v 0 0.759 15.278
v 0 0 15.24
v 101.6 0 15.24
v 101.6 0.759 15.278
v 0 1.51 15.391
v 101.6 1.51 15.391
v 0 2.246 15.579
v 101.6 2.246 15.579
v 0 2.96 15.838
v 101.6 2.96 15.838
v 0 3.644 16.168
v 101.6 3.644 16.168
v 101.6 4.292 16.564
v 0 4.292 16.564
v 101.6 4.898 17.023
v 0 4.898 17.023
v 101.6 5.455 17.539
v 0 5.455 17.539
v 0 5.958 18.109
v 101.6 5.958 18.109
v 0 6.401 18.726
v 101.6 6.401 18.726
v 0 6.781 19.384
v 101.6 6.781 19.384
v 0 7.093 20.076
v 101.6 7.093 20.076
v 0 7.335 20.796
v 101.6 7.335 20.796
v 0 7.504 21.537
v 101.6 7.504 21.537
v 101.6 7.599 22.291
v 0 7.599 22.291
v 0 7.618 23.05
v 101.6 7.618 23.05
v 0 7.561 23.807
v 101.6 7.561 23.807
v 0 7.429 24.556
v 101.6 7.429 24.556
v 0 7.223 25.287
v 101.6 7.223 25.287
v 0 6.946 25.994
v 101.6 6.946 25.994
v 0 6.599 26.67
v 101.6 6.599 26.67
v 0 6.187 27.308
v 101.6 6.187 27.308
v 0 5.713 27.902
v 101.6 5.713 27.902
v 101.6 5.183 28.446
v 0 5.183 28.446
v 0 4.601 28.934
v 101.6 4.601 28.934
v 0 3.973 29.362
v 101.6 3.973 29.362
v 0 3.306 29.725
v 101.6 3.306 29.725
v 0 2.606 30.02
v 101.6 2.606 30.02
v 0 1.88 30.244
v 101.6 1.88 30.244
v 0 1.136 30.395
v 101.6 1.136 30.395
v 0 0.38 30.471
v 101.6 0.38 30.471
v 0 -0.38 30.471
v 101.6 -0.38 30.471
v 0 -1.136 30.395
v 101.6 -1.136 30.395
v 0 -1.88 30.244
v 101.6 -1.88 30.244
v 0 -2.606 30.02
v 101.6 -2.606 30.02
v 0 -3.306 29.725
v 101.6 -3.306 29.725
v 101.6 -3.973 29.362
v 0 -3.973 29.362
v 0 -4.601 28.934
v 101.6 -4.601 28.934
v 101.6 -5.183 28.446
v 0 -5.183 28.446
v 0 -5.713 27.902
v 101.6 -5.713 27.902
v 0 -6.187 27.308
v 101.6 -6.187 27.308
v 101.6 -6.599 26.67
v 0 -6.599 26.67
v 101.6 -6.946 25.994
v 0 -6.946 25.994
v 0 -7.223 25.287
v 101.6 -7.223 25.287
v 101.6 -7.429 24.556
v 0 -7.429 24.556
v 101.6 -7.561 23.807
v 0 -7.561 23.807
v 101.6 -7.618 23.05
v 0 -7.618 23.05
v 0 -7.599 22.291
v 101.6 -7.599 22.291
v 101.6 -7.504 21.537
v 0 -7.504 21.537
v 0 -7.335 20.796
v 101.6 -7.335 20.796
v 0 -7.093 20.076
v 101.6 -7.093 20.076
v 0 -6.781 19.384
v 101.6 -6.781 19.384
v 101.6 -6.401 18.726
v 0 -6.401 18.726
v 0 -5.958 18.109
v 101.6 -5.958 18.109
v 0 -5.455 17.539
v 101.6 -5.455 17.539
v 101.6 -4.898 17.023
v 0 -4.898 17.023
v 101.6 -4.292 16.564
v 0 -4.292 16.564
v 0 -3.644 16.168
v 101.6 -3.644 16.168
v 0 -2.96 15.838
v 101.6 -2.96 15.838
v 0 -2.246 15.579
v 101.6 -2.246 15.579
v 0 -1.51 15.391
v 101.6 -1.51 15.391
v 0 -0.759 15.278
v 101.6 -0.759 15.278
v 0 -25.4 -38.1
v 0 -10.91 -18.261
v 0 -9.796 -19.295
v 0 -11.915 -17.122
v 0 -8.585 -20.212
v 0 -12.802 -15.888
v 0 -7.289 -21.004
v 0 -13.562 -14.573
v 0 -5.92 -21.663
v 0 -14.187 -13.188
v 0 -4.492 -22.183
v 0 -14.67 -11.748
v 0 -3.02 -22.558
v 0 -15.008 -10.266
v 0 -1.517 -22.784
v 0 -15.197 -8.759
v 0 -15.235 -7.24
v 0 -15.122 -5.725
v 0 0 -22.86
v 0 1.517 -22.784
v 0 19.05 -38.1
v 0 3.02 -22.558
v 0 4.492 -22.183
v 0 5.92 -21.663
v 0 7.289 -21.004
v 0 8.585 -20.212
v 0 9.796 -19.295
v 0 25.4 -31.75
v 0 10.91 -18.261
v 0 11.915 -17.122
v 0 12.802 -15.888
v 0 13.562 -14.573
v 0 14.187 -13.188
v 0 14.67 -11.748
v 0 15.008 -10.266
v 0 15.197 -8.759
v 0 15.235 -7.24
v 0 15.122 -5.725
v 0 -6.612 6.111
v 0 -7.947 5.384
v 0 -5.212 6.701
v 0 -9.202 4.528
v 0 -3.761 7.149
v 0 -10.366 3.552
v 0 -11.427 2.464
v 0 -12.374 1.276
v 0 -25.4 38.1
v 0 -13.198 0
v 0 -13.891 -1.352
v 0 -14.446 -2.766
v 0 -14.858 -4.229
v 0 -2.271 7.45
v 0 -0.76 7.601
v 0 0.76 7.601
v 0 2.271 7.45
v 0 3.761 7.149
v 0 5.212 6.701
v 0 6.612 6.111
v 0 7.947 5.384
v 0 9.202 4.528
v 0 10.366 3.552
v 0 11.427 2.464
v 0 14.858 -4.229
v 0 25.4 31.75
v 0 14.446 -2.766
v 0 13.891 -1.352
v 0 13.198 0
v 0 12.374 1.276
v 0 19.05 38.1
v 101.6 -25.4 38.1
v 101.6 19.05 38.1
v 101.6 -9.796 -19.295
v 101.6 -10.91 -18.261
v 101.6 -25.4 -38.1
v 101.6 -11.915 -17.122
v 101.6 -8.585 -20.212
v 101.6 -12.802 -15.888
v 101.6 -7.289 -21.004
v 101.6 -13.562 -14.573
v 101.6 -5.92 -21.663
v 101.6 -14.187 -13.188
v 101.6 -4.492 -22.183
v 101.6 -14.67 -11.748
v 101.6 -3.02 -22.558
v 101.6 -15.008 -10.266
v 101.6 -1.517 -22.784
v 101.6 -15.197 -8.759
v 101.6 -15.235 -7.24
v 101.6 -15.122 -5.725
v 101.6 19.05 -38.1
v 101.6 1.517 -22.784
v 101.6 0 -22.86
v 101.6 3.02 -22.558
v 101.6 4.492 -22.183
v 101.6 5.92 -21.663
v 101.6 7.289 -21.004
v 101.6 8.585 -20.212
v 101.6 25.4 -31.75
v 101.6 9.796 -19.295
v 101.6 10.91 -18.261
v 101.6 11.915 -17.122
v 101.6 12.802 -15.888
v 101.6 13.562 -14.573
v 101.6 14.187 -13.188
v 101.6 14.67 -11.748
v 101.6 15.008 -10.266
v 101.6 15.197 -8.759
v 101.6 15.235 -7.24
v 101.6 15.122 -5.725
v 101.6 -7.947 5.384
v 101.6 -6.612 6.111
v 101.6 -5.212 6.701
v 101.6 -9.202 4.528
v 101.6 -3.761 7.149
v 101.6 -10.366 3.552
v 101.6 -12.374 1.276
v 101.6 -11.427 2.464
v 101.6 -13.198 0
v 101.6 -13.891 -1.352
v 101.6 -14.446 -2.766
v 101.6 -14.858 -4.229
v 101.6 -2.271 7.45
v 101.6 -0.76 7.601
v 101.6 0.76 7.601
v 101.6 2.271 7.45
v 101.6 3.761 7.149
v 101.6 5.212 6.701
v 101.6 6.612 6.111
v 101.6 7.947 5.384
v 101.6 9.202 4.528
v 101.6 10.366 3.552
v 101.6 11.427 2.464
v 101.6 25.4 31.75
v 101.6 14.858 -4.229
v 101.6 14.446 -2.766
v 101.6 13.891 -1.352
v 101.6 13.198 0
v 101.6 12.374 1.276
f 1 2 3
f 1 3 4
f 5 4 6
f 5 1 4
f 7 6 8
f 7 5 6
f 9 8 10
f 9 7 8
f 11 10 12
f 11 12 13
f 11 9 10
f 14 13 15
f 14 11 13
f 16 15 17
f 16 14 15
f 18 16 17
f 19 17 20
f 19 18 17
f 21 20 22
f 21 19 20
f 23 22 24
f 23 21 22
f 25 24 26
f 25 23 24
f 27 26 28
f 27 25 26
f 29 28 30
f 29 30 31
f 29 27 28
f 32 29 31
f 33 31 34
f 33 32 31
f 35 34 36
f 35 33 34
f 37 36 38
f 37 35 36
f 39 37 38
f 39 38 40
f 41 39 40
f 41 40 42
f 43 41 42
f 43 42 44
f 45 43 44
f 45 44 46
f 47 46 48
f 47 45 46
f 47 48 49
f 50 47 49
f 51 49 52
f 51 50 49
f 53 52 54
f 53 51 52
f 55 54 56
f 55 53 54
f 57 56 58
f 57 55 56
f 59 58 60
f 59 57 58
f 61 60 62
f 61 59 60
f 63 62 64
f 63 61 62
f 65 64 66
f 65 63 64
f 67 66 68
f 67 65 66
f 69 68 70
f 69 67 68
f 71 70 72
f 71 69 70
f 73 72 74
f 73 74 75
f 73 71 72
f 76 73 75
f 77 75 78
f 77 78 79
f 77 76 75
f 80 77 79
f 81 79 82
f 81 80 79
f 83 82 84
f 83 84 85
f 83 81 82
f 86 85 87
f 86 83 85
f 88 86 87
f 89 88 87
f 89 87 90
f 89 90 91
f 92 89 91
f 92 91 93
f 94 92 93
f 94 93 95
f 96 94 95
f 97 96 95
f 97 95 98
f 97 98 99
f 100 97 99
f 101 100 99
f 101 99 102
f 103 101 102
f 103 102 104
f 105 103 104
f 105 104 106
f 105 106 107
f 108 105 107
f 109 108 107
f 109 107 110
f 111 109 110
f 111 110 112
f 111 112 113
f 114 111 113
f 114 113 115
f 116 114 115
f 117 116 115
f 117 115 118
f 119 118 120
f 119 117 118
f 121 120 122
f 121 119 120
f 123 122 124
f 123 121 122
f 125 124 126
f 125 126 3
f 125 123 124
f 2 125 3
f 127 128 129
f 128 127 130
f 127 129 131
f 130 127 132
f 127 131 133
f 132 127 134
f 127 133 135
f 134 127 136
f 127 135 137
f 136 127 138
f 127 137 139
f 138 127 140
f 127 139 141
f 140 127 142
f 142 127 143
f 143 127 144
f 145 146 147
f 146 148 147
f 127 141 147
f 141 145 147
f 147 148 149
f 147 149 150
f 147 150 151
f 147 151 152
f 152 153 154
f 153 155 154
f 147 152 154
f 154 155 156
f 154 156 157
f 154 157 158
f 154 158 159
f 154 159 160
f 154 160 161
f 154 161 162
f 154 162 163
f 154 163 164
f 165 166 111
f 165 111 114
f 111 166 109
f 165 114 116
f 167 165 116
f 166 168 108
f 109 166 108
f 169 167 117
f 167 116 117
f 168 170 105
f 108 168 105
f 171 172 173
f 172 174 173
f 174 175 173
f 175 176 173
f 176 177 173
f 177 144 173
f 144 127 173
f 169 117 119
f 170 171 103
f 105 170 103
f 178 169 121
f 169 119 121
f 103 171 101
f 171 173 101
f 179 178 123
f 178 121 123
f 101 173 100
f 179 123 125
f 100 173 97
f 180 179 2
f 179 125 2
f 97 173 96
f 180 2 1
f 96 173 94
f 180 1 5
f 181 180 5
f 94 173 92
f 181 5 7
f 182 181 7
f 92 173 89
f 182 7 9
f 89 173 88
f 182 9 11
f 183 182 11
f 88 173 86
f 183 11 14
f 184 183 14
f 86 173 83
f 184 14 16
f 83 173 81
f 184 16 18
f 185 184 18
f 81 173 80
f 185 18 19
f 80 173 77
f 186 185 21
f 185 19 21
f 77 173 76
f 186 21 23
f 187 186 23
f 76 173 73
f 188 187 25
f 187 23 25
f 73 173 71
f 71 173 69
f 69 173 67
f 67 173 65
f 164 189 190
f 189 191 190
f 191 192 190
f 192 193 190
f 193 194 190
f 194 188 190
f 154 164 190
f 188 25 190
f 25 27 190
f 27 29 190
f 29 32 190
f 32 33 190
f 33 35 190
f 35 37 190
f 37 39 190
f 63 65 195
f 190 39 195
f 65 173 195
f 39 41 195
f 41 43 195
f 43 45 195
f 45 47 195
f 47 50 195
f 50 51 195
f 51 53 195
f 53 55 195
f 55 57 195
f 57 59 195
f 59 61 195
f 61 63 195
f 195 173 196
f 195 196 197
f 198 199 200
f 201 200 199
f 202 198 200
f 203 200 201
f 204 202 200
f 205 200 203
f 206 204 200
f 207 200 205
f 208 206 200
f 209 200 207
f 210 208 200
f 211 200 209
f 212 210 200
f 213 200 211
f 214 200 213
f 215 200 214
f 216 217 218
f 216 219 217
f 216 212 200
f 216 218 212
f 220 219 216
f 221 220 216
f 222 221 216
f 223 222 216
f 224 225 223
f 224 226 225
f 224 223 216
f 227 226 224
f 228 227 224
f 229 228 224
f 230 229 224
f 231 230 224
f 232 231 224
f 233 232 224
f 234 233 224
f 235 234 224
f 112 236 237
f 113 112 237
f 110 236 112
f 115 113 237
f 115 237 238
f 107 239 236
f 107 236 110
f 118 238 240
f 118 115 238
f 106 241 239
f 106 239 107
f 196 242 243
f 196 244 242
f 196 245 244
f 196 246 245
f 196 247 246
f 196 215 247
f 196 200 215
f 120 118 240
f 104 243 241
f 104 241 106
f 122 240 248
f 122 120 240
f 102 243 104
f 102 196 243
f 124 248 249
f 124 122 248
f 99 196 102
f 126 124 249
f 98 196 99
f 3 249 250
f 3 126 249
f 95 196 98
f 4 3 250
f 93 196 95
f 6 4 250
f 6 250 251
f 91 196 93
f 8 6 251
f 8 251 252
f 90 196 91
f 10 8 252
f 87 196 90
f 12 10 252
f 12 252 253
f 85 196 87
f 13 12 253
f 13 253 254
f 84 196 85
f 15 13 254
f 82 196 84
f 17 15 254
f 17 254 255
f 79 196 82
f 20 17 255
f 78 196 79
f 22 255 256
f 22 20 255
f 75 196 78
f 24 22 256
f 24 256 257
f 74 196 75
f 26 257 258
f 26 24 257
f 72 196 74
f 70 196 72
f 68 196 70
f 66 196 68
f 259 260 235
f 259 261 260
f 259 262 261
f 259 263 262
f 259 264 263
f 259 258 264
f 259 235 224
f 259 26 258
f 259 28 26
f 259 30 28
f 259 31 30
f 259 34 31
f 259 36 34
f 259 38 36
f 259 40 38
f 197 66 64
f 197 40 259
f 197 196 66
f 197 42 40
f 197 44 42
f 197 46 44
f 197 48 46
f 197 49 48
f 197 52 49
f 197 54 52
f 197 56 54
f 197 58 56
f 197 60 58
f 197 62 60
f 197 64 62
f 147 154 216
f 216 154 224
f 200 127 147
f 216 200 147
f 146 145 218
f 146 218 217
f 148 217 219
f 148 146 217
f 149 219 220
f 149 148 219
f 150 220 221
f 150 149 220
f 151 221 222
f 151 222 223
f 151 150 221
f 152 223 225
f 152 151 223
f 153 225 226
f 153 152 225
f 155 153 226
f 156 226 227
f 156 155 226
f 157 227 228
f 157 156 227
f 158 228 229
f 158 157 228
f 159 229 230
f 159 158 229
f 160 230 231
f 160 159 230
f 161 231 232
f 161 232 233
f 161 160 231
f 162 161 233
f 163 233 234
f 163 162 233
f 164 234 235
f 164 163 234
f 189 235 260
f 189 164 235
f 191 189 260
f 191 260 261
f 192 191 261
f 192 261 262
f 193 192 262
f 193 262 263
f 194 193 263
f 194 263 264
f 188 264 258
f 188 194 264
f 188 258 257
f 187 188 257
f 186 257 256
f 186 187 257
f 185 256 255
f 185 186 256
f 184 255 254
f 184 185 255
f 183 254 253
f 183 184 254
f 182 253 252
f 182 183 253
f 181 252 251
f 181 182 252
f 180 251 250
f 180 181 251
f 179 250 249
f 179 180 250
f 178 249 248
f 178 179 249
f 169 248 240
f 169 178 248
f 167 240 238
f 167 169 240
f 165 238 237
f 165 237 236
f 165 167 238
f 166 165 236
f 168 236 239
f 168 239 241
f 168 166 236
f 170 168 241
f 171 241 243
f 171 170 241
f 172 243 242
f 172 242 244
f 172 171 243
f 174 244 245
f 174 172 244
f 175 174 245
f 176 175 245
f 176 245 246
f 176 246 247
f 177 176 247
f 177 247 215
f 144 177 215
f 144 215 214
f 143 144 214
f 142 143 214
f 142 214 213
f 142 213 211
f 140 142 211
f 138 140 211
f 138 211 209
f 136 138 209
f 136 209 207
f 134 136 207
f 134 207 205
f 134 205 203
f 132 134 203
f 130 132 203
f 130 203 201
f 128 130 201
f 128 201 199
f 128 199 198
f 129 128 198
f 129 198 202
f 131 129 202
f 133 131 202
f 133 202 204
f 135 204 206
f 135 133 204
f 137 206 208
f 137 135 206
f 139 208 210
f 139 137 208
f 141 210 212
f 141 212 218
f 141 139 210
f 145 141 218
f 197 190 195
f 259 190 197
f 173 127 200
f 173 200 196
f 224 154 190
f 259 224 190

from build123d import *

# Parameters (mm, degrees)
SKETCH1_W           = 50.8
SKETCH1_H           = 76.2
SKETCH1_R           = 15.24
SKETCH1_R_2         = 7.62
BOSS_EXTRUDE1_DEPTH = 101.6
CHAMFER1_SIZE       = 6.35


with BuildPart() as part:
    # Sketch1 → Boss-Extrude1 (new body)
    with BuildSketch(Plane.YZ):
        Rectangle(SKETCH1_W, SKETCH1_H)
        with Locations(Location((0, -7.62, 0), (0, 0, 270))):
            Circle(SKETCH1_R, mode=Mode.SUBTRACT)
        with Locations(Location((0, 22.86, 0), (0, 0, 270))):
            Circle(SKETCH1_R_2, mode=Mode.SUBTRACT)
    extrude(amount=BOSS_EXTRUDE1_DEPTH)

    # Chamfer1
    chamfer1_edges = [part.edges().sort_by_distance(p)[0] for p in [
        (50.8, 25.4, 38.1),
        (50.8, 25.4, -38.1),
    ]]
    chamfer(chamfer1_edges, length=CHAMFER1_SIZE)


solid = part.part
